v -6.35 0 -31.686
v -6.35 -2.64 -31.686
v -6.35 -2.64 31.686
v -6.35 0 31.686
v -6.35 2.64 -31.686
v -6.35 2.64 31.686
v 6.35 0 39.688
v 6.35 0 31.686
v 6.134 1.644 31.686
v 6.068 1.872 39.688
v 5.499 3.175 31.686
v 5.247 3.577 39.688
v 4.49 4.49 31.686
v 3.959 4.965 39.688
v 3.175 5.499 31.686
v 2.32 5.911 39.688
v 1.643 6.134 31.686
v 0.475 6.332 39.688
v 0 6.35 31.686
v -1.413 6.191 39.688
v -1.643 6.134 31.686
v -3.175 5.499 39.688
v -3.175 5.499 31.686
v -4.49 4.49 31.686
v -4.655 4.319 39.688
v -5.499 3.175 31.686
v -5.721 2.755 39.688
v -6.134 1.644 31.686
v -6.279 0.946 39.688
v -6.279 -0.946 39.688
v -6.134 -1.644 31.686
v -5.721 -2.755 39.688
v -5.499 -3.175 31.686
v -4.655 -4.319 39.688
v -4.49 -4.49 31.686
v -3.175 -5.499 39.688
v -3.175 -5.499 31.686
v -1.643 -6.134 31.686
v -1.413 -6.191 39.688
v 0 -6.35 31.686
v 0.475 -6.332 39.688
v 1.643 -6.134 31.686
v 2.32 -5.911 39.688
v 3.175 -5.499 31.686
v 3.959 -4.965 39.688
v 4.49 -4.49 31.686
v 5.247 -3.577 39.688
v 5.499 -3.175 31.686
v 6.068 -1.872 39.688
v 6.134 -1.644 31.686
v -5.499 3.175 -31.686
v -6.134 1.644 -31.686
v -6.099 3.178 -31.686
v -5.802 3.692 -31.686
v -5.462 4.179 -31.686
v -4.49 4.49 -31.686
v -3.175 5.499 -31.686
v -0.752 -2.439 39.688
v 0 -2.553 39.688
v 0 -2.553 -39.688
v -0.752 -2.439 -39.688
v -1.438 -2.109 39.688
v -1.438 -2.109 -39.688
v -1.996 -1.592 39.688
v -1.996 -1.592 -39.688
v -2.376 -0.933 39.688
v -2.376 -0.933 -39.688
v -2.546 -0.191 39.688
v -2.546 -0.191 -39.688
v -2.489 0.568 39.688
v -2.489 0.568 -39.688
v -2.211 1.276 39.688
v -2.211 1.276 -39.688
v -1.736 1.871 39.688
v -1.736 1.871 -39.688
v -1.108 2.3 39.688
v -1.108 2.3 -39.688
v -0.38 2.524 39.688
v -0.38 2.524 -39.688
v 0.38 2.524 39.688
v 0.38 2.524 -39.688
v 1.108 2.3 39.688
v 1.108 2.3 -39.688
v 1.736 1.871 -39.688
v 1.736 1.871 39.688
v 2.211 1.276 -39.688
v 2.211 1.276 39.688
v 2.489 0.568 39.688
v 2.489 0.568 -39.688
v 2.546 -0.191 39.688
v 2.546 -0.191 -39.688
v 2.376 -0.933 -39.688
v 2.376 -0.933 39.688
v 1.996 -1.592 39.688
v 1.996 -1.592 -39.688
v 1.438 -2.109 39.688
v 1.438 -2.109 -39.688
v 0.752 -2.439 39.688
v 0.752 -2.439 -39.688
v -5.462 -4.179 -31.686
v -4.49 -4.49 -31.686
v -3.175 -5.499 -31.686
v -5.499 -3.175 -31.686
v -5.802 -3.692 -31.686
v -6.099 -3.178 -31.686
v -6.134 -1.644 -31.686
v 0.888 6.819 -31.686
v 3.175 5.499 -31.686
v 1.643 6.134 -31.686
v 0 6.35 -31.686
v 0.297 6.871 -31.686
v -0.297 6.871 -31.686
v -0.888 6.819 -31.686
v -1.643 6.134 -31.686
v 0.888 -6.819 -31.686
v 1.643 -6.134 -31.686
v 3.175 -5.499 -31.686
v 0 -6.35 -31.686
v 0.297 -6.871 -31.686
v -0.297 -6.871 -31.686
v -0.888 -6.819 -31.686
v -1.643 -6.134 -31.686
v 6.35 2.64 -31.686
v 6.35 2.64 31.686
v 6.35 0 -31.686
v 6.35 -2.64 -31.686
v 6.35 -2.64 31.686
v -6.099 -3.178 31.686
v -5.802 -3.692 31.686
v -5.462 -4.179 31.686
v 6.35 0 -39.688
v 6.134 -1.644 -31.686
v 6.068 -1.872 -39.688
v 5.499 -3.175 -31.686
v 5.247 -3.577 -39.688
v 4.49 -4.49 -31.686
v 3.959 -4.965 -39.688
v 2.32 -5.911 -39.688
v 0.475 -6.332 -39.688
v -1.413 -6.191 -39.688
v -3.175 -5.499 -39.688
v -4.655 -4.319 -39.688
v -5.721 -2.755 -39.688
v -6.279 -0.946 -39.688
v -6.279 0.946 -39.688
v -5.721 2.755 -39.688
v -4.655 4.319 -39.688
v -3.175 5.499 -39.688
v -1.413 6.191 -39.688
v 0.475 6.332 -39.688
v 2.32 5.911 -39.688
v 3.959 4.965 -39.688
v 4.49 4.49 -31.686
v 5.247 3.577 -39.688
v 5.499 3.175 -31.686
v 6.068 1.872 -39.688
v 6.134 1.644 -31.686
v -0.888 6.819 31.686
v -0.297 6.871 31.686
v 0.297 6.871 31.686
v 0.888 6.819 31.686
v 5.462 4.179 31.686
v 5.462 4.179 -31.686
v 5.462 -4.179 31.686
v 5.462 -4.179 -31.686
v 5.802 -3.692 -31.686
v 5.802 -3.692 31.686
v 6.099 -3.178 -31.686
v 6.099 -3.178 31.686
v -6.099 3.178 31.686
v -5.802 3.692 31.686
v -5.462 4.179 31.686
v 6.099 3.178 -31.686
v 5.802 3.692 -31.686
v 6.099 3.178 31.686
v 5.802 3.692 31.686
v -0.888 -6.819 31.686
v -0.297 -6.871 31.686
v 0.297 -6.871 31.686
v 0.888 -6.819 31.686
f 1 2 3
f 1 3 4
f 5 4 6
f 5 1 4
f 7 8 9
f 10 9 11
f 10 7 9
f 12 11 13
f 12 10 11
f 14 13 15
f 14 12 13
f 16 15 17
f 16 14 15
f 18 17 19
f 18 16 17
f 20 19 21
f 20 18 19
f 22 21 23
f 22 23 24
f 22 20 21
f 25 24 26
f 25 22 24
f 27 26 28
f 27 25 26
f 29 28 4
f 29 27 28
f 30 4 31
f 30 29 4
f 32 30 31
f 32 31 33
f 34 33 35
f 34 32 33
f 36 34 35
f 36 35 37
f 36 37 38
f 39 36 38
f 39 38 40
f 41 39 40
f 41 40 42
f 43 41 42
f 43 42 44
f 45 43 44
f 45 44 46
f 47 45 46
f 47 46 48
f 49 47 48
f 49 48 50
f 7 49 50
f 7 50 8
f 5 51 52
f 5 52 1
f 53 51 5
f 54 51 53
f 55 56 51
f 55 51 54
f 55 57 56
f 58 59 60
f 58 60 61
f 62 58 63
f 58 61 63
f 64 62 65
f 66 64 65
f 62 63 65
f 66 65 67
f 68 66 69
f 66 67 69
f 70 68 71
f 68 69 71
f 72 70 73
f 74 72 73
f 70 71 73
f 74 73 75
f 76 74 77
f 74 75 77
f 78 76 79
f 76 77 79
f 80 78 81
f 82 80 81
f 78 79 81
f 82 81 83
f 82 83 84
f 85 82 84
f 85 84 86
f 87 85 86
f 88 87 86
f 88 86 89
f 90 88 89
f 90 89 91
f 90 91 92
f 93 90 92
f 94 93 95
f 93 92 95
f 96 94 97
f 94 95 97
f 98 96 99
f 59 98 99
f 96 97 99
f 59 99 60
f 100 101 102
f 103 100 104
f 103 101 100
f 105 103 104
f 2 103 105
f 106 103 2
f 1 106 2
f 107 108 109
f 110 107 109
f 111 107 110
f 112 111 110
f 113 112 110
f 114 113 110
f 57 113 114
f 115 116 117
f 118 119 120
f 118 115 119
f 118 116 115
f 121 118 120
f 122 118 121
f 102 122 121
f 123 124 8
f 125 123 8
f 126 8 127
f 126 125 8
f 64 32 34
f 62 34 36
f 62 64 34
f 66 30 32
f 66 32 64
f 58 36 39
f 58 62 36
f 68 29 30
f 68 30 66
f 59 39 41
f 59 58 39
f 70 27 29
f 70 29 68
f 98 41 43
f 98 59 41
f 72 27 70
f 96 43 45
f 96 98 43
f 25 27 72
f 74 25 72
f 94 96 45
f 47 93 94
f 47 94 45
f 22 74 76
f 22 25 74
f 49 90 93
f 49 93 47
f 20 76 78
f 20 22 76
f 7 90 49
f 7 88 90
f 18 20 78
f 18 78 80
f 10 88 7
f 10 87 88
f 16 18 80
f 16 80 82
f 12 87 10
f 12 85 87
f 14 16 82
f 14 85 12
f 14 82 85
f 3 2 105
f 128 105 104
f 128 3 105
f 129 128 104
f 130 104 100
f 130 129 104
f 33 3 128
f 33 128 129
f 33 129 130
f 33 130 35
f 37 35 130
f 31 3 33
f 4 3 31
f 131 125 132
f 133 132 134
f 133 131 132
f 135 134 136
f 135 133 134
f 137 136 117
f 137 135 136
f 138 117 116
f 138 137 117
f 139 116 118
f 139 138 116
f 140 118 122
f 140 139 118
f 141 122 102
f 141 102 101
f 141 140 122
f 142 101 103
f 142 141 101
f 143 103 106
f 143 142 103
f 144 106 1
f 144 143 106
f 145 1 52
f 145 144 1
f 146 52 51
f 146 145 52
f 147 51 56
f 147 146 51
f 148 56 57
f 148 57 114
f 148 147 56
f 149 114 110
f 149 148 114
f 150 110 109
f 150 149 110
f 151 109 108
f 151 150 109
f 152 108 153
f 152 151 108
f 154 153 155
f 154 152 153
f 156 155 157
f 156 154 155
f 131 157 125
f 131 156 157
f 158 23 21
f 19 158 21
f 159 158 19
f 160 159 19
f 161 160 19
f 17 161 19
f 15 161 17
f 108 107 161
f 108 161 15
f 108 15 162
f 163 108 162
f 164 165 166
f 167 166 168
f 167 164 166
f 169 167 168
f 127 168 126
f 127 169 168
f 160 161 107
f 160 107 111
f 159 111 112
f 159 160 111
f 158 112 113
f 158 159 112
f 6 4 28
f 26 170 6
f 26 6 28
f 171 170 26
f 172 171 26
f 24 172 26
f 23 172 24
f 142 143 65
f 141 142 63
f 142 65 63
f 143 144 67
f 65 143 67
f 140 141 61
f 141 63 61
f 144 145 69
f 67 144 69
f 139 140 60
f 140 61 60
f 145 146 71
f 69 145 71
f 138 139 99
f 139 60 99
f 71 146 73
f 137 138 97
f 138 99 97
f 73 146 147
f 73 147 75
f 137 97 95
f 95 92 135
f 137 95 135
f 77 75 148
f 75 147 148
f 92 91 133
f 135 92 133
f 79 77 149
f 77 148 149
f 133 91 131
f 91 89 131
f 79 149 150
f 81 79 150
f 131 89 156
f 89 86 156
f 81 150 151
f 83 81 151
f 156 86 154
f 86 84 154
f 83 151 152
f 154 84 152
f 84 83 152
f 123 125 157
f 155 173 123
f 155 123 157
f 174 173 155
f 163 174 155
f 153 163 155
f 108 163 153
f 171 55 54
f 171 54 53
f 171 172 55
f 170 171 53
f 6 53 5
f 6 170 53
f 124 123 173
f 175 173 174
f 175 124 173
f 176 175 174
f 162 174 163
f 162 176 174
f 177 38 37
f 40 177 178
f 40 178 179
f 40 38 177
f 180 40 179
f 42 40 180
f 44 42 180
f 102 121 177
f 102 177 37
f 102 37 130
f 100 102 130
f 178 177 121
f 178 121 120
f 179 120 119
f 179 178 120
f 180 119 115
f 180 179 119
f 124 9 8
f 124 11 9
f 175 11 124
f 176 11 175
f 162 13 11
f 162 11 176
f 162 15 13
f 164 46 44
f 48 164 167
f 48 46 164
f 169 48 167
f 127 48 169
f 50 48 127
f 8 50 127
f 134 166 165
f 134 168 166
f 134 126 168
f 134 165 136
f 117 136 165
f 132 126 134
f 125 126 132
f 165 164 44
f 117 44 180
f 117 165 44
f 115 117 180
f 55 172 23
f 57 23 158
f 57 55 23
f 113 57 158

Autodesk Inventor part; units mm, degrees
ref_plane "YZ Plane" through (0, 0, 0) normal (1, 0, 0) x (0, 1, 0)
ref_plane "XZ Plane" through (0, 0, 0) normal (0, 1, 0) x (-1, 0, 0)
ref_plane "XY Plane" through (0, 0, 0) normal (0, 0, 1) x (1, 0, 0)
sketch "Sketch1" plane through (0, 0, 0) normal (0, 0, 1) x (1, 0, 0)
  line L0 (-6.35, -3.6662) -> (-6.35, 3.6662)
  line L1 (-6.35, 3.6662) -> (0, 7.3323)
  line L2 (0, 7.3323) -> (6.35, 3.6662)
  line L3 (6.35, 3.6662) -> (6.35, -3.6662)
  line L4 (6.35, -3.6662) -> (0, -7.3323)
  line L5 (0, -7.3323) -> (-6.35, -3.6662)
  point P0 (0, 0)
  point P1 (0, 0)
  dimension "Size" = 12.7
extrude "Extrusion1" add sketch "Sketch1" along normal mid plane 79.375
sketch "Sketch3" plane through (0, 0, 39.6875) normal (0, 0, 1) x (1, 0, 0)
  line L0 (-6.35, 3.6662) -> (0, 7.3323) construction
  line L1 (0, 7.3323) -> (6.35, 3.6662) construction
  line L2 (6.35, 3.6662) -> (6.35, -3.6662) construction
  line L3 (6.35, -3.6662) -> (0, -7.3323) construction
  line L4 (0, -7.3323) -> (-6.35, -3.6662) construction
  line L5 (-6.35, -3.6662) -> (-6.35, 3.6662) construction
  point P0 (0, 0)
hole "Hole1" at (0, 0, 39.6875) direction (0, 0, -1) diameter 5.1054 end through all
sketch "Sketch4" plane through (0, 0, 39.6875) normal (0, 0, 1) x (1, 0, 0)
  circle A0 centre (0, 0) radius 2.5527 construction
  line L0 (-6.35, 3.6662) -> (0, 7.3323) construction
  line L1 (0, 7.3323) -> (6.35, 3.6662) construction
  line L2 (6.35, 3.6662) -> (6.35, -3.6662) construction
  line L3 (6.35, -3.6662) -> (0, -7.3323) construction
  line L4 (0, -7.3323) -> (-6.35, -3.6662) construction
  line L5 (-6.35, -3.6662) -> (-6.35, 3.6662) construction
  circle A1 centre (0, 0) radius 6.8771
  circle A2 centre (0, 0) radius 8.89
  dimension "thunder" = 13.7541
  dimension "d16" = 17.78
extrude "Extrusion3" cut sketch "Sketch4" against normal through all
sketch "Sketch5" plane through (0, 0, 39.6875) normal (0, 0, 1) x (1, 0, 0)
  arc A0 (5.4616, -4.1791) -> (6.35, -2.6403) centre (0, 0) ccw projected
  line L0 (5.4616, -4.1791) -> (0.8884, -6.8194) projected
  arc A1 (-0.8884, -6.8194) -> (0.8884, -6.8194) centre (0, 0) ccw projected
  line L1 (-0.8884, -6.8194) -> (-5.4616, -4.1791) projected
  arc A2 (-6.35, -2.6403) -> (-5.4616, -4.1791) centre (0, 0) ccw projected
  line L2 (-6.35, -2.6403) -> (-6.35, 2.6403) projected
  arc A3 (-5.4616, 4.1791) -> (-6.35, 2.6403) centre (0, 0) ccw projected
  line L3 (-5.4616, 4.1791) -> (-0.8884, 6.8194) projected
  arc A4 (0.8884, 6.8194) -> (-0.8884, 6.8194) centre (0, 0) ccw projected
  line L4 (0.8884, 6.8194) -> (5.4616, 4.1791) projected
  arc A5 (6.35, 2.6403) -> (5.4616, 4.1791) centre (0, 0) ccw projected
  line L5 (6.35, 2.6403) -> (6.35, -2.6403) projected
  circle A6 centre (0, 0) radius 2.5527 projected
  circle A7 centre (0, 0) radius 6.35
  point P0 (-3.175, 5.4993)
  point P1 (3.175, 5.4993)
  point P2 (6.35, 0)
  point P3 (-6.35, 0)
  point P4 (-3.175, -5.4993)
  point P5 (3.175, -5.4993)
  dimension "d19" = 12.7
extrude "Extrusion4" cut sketch "Sketch5" against normal blind 8.001 contours L0 A7 L5 A0 | L0 A1 L1 A7 | A7 L4 A5 L5 | L1 A2 L2 A7 | A7 L3 A4 L4 | L2 A3 L3 A7
mirror "Mirror2" about plane through (0, 0, 0) normal (0, 0, 1) of "Extrusion4"
equation "\"bearing\" = 25.4"
properties part number "CL4-011" material "Aluminum 6061"
